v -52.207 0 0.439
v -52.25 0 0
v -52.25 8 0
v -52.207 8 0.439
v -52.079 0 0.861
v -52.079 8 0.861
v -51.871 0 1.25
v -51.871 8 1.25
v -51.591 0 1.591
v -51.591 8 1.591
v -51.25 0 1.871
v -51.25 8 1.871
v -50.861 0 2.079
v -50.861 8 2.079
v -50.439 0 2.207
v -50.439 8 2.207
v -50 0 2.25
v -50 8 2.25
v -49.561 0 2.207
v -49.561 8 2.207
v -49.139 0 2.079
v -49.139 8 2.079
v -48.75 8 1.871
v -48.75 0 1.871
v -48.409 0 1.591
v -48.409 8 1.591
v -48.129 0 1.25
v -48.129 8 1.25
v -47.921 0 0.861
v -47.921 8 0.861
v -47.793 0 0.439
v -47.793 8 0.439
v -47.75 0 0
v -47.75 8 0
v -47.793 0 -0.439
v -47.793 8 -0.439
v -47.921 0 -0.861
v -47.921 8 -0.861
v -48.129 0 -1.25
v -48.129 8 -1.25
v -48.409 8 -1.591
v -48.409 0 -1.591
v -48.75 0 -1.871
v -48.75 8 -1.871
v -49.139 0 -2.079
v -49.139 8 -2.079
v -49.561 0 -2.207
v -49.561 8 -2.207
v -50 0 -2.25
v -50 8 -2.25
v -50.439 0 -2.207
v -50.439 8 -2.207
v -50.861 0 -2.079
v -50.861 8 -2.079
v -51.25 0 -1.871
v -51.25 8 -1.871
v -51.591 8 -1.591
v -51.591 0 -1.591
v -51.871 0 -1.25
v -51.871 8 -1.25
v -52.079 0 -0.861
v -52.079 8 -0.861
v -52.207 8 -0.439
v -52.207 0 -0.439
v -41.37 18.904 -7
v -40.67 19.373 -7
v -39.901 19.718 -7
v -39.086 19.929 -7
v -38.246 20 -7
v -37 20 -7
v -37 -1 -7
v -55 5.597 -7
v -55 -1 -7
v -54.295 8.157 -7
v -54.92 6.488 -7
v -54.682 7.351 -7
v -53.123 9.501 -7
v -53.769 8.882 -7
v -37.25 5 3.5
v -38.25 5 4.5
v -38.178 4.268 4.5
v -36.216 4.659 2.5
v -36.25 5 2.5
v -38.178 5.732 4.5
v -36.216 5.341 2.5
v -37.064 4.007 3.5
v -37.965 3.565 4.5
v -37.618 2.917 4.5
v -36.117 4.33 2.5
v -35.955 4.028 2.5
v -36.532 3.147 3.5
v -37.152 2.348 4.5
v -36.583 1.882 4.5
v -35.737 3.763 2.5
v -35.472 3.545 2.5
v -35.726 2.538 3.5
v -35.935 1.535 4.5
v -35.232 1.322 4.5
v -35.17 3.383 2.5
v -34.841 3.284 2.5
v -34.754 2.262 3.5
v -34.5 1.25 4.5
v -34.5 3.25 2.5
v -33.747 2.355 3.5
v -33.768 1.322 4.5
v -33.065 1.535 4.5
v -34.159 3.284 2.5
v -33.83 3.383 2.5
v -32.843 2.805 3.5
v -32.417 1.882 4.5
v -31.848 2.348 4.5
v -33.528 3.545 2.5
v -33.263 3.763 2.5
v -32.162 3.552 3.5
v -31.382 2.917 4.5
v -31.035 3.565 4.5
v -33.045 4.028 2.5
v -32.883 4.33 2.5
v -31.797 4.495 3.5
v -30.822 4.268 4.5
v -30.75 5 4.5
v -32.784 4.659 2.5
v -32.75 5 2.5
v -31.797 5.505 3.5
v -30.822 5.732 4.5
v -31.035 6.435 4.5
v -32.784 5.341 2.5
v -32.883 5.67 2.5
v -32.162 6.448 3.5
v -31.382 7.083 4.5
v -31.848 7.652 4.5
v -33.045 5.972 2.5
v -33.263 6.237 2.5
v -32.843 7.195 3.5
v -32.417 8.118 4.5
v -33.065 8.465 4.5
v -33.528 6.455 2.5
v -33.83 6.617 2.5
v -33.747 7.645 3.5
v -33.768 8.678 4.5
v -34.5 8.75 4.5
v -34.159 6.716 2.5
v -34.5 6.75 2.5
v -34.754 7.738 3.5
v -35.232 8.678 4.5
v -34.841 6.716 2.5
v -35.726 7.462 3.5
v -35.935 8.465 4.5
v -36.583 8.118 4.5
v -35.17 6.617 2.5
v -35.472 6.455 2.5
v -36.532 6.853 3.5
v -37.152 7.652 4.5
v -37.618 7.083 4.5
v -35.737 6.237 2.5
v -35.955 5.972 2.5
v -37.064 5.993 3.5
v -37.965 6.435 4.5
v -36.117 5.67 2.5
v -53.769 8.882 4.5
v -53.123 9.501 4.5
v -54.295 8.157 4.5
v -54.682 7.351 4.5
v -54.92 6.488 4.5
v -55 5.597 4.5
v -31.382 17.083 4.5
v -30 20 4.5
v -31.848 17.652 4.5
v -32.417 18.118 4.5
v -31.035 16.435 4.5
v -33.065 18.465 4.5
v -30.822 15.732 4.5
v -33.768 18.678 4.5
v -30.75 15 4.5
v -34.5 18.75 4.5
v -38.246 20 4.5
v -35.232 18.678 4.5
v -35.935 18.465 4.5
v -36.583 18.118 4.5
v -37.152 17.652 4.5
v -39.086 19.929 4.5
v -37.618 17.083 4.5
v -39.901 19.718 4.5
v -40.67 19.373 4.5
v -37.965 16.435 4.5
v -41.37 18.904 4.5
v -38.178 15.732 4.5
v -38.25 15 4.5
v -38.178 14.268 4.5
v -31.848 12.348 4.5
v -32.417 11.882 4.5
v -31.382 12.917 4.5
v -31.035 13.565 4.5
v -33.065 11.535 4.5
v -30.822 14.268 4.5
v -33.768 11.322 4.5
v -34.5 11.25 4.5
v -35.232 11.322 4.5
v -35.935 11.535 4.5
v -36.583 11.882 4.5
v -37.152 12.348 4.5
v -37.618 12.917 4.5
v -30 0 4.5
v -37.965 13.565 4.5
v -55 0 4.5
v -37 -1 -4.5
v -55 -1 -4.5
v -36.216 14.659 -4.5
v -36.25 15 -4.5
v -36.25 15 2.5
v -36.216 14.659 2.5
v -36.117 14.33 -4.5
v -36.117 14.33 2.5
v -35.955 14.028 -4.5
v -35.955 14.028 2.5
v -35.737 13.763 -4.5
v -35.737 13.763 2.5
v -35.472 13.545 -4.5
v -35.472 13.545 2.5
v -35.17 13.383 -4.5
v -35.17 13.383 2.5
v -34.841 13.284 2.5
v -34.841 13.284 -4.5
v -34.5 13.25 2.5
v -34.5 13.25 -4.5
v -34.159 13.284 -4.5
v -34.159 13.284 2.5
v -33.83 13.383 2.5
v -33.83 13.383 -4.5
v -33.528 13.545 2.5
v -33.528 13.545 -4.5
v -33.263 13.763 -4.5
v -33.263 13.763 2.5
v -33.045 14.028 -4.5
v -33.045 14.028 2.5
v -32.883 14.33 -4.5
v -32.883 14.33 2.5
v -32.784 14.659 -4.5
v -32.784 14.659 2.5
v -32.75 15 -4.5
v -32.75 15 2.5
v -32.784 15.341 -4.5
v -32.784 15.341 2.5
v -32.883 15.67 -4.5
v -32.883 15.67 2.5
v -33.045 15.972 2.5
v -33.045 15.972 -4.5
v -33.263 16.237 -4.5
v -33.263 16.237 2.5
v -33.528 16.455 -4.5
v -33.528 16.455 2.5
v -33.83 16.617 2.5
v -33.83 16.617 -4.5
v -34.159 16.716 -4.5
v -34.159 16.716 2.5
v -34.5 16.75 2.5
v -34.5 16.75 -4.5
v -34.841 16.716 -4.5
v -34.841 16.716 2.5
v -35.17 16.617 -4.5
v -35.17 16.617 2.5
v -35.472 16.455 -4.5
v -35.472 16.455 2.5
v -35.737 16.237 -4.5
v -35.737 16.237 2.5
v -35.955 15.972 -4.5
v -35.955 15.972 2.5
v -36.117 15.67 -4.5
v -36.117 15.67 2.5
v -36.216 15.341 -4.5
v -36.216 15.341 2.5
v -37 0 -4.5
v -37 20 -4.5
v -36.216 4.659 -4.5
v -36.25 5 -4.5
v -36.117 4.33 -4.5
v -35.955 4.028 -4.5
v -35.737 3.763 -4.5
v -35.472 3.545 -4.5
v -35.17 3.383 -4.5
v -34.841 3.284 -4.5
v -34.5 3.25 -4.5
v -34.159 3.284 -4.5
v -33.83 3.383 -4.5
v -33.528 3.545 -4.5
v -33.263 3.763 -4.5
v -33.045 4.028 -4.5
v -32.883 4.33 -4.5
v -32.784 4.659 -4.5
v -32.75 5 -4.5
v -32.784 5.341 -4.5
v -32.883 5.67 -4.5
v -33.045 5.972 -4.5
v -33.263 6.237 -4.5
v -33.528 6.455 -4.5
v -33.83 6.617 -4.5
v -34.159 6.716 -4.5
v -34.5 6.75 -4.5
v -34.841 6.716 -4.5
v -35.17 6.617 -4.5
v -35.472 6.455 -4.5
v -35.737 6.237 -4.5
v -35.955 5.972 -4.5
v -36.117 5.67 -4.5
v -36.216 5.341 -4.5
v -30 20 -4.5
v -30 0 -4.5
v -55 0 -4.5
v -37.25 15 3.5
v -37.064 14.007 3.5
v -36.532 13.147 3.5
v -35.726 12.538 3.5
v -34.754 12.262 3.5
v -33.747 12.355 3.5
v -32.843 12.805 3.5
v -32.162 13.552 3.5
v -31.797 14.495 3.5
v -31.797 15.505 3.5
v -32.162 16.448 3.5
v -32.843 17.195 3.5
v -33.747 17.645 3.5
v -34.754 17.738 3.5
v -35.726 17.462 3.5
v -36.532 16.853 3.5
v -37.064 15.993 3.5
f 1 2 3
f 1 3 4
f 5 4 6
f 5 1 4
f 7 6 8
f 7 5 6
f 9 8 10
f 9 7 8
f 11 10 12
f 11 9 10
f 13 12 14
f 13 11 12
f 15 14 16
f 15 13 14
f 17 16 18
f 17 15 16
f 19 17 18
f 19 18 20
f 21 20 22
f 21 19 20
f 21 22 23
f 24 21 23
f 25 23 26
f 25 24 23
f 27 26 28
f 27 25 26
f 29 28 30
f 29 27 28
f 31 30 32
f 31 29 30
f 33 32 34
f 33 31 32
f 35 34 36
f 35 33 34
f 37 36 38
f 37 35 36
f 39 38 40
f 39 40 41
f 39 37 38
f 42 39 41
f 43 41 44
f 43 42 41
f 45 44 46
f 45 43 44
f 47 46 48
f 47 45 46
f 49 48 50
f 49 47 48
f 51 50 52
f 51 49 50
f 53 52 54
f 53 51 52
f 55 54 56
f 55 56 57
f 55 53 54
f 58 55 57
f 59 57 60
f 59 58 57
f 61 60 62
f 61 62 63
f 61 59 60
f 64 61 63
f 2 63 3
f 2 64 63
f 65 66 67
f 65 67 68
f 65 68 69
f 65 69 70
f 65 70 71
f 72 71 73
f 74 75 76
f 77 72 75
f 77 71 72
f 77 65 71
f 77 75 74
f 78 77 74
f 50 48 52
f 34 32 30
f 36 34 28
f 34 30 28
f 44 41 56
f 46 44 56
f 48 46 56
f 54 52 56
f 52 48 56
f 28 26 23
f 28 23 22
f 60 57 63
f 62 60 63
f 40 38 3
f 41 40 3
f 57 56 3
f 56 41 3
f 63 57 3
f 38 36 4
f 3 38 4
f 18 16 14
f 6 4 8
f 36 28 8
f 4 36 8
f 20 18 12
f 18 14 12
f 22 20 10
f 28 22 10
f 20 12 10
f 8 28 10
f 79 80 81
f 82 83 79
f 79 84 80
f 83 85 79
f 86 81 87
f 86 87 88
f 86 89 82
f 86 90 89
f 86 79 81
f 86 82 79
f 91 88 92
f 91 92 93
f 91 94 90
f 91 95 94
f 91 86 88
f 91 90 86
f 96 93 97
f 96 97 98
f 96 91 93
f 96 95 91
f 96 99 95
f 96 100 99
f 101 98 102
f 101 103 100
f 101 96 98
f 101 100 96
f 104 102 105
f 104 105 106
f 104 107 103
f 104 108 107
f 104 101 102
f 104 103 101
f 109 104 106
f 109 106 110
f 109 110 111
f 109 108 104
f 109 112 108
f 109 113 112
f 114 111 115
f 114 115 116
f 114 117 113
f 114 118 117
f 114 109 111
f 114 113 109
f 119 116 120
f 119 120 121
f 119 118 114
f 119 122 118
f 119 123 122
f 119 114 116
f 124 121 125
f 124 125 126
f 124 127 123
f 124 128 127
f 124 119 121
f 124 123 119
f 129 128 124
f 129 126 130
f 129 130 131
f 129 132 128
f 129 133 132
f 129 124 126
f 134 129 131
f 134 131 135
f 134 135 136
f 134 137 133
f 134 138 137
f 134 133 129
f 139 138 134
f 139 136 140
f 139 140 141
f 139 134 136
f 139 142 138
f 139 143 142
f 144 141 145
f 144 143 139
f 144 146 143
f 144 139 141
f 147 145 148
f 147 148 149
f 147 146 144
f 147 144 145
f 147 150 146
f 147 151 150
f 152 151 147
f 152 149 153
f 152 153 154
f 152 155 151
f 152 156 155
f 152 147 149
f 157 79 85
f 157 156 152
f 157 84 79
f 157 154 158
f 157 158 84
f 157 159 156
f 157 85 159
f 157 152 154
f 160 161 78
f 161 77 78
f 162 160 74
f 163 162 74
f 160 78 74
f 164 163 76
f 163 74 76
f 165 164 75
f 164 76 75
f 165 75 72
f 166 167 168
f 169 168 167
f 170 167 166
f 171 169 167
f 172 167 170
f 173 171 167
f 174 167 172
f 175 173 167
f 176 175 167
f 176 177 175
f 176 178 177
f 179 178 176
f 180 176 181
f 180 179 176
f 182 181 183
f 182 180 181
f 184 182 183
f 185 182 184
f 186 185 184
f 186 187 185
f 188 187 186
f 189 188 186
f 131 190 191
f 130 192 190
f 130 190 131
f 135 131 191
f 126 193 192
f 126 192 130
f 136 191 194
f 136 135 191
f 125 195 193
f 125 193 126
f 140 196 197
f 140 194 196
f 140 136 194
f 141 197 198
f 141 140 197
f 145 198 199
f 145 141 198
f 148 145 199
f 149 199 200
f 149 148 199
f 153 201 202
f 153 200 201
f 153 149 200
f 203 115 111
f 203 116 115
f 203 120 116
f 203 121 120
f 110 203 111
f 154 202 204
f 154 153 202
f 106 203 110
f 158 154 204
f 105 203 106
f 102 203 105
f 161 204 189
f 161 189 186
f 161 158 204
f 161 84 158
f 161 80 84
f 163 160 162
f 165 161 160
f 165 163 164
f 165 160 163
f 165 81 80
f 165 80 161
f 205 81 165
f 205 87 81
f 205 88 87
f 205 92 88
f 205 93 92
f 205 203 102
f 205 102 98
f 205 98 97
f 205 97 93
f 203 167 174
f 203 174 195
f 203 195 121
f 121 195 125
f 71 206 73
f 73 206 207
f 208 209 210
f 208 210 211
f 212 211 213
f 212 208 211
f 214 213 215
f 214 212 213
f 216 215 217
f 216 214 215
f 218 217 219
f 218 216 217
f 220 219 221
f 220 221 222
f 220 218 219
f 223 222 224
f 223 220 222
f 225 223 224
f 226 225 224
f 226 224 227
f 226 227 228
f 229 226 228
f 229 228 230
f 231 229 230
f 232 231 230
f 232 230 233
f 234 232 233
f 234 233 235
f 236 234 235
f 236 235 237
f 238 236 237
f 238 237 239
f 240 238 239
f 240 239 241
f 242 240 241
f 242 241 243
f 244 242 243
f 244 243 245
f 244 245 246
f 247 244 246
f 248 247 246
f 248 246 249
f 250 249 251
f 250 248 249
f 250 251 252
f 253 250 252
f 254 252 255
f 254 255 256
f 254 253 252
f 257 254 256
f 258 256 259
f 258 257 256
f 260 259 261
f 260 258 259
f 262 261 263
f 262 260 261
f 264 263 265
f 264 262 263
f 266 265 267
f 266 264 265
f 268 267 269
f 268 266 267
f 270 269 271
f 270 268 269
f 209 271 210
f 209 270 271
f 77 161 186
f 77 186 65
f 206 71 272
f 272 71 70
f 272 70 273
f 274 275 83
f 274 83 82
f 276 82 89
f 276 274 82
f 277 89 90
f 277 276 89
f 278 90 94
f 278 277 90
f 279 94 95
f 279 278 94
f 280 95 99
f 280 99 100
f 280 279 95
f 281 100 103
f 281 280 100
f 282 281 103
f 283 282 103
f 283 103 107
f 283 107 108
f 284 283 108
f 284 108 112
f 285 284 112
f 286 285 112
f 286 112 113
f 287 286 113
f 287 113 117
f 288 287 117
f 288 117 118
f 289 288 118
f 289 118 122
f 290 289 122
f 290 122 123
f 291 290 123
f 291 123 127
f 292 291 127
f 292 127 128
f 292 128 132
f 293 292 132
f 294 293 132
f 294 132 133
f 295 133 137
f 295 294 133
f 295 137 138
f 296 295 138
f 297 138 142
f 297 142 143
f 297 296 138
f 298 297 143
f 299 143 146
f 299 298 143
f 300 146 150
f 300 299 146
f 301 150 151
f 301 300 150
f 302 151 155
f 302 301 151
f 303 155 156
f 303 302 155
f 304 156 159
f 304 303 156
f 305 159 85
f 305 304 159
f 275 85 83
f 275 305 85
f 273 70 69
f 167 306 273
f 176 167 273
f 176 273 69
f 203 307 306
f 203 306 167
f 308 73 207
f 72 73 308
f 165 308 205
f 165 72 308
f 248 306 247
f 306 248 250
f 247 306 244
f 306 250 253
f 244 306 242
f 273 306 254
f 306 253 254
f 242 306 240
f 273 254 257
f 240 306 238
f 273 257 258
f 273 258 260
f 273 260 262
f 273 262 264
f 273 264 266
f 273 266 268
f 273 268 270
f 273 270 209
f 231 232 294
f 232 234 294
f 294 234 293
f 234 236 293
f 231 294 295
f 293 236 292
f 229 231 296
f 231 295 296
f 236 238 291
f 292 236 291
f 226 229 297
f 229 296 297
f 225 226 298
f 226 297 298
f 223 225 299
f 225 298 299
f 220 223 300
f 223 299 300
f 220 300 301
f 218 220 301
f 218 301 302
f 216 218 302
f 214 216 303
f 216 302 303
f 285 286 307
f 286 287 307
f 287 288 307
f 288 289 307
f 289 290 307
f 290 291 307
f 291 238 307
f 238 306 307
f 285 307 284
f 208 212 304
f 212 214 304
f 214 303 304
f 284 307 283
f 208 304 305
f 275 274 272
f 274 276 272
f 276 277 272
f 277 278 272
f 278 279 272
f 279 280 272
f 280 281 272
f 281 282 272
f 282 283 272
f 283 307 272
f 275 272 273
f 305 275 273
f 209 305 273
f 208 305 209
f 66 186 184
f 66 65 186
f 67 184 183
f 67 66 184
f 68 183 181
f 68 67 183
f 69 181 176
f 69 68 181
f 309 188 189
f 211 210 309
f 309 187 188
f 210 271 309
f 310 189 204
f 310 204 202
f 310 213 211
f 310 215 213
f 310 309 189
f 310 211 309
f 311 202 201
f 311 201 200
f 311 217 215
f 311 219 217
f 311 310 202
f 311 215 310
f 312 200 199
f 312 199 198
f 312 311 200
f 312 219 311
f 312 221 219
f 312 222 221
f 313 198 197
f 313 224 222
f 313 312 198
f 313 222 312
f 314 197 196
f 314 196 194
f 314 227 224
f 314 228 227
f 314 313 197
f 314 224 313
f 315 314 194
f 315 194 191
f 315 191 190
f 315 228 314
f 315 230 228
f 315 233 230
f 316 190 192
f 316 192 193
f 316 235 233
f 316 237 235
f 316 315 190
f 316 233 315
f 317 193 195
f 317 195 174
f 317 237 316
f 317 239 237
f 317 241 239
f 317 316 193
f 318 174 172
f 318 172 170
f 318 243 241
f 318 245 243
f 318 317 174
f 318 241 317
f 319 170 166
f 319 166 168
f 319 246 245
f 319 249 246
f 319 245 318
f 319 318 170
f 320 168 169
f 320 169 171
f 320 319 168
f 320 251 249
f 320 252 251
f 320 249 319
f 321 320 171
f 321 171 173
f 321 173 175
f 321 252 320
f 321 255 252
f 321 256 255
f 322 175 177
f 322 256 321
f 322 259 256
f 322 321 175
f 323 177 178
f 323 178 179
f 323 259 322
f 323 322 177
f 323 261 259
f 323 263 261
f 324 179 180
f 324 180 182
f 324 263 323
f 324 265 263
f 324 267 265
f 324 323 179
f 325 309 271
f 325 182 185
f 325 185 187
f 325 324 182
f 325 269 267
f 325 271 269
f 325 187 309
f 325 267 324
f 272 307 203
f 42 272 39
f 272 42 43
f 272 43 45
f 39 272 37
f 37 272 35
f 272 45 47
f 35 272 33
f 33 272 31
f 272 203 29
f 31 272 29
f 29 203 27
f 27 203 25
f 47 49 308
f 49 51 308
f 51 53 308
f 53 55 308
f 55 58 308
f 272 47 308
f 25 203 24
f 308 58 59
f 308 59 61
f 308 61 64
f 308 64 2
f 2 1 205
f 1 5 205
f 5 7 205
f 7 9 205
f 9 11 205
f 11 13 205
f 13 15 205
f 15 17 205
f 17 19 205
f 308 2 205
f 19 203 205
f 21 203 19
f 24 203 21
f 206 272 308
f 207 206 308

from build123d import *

# Parameters (mm, degrees)
SKETCH236_W      = 25
SKETCH236_H      = 9
PAD097_DEPTH     = 20
SKETCH237_W      = 18
SKETCH237_H      = 20
PAD098_DEPTH     = 2.5
SKETCH238_R      = 1.75
POCKET034_DEPTH  = 11
CHAMFER030_SIZE  = 2
SKETCH239_R      = 2.25
POCKET035_DEPTH  = 8
CHAMFER031_SIZE2 = 12
CHAMFER031_SIZE  = 15
SKETCH240_W      = 18
SKETCH240_H      = 2.5
PAD099_DEPTH     = 1
FILLET025_R      = 5


with BuildPart() as body044:
    # Sketch236 → Pad097 (new body)
    with BuildSketch(Plane.XZ):
        with Locations((12.5, 0)):
            Rectangle(SKETCH236_W, SKETCH236_H)
    extrude(amount=-PAD097_DEPTH)

    # Sketch237 (on Face2 of Pad097) → Pad098 (join)
    with BuildSketch(Plane(origin=(0, 0, -4.5), x_dir=(1, 0, 0), z_dir=(0, 0, -1))):
        with Locations((16, -10)):
            Rectangle(SKETCH237_W, SKETCH237_H)
    extrude(amount=PAD098_DEPTH)

    # Sketch238 (on Face3 of Pad098) → Pocket034 (cut)
    with BuildSketch(Plane(origin=(0, 0, -4.5), x_dir=(1, 0, 0), z_dir=(0, 0, -1))):
        with Locations((4.5, -5)):
            Circle(SKETCH238_R)
        with Locations((4.5, -15)):
            Circle(SKETCH238_R)
    extrude(amount=-POCKET034_DEPTH, mode=Mode.SUBTRACT)

    # Chamfer030
    chamfer030_edges = [body044.edges().sort_by_distance(p)[0] for p in [
        (2.75, 15, 4.5),
        (2.75, 5, 4.5),
    ]]
    chamfer(chamfer030_edges, length=CHAMFER030_SIZE)

    # Sketch239 (on Face4 of Chamfer030) → Pocket035 (cut)
    with BuildSketch(Plane.XZ):
        with Locations((20, 0)):
            Circle(SKETCH239_R)
    extrude(amount=-POCKET035_DEPTH, mode=Mode.SUBTRACT)

    # Chamfer031
    chamfer031_edges = [body044.edges().sort_by_distance(p)[0] for p in [
        (25, 20, -1.25),
    ]]
    chamfer031_side = body044.faces().sort_by_distance((13.083333, 20, -0.958333))[0]
    chamfer(chamfer031_edges, length=CHAMFER031_SIZE, length2=CHAMFER031_SIZE2, reference=chamfer031_side)

    # Sketch240 (on Face6 of Chamfer031) → Pad099 (join)
    with BuildSketch(Plane.XZ):
        with Locations((16, -5.75)):
            Rectangle(SKETCH240_W, SKETCH240_H)
    extrude(amount=PAD099_DEPTH)

    # Fillet025
    fillet025_edges = [body044.edges().sort_by_distance(p)[0] for p in [
        (25, 8, -1.25),
        (10, 20, -1.25),
    ]]
    fillet(fillet025_edges, radius=FILLET025_R)


with BuildPart() as body044_1:
    # Body044 placement: moved
    add(body044.part.moved(Location((10, 0, 0))))


with BuildPart() as part_mirroring002:
    # Part__Mirroring002: instance of Body044
    add(body044_1.part.mirror(Plane(origin=(0, 0, 0), x_dir=(0, -1, 0), z_dir=(1, 0, 0))))


with BuildPart() as part_mirroring002_1:
    # Part__Mirroring002 placement: moved
    add(part_mirroring002.part.moved(Location((-20, 0, 0))))


solid = part_mirroring002_1.part
